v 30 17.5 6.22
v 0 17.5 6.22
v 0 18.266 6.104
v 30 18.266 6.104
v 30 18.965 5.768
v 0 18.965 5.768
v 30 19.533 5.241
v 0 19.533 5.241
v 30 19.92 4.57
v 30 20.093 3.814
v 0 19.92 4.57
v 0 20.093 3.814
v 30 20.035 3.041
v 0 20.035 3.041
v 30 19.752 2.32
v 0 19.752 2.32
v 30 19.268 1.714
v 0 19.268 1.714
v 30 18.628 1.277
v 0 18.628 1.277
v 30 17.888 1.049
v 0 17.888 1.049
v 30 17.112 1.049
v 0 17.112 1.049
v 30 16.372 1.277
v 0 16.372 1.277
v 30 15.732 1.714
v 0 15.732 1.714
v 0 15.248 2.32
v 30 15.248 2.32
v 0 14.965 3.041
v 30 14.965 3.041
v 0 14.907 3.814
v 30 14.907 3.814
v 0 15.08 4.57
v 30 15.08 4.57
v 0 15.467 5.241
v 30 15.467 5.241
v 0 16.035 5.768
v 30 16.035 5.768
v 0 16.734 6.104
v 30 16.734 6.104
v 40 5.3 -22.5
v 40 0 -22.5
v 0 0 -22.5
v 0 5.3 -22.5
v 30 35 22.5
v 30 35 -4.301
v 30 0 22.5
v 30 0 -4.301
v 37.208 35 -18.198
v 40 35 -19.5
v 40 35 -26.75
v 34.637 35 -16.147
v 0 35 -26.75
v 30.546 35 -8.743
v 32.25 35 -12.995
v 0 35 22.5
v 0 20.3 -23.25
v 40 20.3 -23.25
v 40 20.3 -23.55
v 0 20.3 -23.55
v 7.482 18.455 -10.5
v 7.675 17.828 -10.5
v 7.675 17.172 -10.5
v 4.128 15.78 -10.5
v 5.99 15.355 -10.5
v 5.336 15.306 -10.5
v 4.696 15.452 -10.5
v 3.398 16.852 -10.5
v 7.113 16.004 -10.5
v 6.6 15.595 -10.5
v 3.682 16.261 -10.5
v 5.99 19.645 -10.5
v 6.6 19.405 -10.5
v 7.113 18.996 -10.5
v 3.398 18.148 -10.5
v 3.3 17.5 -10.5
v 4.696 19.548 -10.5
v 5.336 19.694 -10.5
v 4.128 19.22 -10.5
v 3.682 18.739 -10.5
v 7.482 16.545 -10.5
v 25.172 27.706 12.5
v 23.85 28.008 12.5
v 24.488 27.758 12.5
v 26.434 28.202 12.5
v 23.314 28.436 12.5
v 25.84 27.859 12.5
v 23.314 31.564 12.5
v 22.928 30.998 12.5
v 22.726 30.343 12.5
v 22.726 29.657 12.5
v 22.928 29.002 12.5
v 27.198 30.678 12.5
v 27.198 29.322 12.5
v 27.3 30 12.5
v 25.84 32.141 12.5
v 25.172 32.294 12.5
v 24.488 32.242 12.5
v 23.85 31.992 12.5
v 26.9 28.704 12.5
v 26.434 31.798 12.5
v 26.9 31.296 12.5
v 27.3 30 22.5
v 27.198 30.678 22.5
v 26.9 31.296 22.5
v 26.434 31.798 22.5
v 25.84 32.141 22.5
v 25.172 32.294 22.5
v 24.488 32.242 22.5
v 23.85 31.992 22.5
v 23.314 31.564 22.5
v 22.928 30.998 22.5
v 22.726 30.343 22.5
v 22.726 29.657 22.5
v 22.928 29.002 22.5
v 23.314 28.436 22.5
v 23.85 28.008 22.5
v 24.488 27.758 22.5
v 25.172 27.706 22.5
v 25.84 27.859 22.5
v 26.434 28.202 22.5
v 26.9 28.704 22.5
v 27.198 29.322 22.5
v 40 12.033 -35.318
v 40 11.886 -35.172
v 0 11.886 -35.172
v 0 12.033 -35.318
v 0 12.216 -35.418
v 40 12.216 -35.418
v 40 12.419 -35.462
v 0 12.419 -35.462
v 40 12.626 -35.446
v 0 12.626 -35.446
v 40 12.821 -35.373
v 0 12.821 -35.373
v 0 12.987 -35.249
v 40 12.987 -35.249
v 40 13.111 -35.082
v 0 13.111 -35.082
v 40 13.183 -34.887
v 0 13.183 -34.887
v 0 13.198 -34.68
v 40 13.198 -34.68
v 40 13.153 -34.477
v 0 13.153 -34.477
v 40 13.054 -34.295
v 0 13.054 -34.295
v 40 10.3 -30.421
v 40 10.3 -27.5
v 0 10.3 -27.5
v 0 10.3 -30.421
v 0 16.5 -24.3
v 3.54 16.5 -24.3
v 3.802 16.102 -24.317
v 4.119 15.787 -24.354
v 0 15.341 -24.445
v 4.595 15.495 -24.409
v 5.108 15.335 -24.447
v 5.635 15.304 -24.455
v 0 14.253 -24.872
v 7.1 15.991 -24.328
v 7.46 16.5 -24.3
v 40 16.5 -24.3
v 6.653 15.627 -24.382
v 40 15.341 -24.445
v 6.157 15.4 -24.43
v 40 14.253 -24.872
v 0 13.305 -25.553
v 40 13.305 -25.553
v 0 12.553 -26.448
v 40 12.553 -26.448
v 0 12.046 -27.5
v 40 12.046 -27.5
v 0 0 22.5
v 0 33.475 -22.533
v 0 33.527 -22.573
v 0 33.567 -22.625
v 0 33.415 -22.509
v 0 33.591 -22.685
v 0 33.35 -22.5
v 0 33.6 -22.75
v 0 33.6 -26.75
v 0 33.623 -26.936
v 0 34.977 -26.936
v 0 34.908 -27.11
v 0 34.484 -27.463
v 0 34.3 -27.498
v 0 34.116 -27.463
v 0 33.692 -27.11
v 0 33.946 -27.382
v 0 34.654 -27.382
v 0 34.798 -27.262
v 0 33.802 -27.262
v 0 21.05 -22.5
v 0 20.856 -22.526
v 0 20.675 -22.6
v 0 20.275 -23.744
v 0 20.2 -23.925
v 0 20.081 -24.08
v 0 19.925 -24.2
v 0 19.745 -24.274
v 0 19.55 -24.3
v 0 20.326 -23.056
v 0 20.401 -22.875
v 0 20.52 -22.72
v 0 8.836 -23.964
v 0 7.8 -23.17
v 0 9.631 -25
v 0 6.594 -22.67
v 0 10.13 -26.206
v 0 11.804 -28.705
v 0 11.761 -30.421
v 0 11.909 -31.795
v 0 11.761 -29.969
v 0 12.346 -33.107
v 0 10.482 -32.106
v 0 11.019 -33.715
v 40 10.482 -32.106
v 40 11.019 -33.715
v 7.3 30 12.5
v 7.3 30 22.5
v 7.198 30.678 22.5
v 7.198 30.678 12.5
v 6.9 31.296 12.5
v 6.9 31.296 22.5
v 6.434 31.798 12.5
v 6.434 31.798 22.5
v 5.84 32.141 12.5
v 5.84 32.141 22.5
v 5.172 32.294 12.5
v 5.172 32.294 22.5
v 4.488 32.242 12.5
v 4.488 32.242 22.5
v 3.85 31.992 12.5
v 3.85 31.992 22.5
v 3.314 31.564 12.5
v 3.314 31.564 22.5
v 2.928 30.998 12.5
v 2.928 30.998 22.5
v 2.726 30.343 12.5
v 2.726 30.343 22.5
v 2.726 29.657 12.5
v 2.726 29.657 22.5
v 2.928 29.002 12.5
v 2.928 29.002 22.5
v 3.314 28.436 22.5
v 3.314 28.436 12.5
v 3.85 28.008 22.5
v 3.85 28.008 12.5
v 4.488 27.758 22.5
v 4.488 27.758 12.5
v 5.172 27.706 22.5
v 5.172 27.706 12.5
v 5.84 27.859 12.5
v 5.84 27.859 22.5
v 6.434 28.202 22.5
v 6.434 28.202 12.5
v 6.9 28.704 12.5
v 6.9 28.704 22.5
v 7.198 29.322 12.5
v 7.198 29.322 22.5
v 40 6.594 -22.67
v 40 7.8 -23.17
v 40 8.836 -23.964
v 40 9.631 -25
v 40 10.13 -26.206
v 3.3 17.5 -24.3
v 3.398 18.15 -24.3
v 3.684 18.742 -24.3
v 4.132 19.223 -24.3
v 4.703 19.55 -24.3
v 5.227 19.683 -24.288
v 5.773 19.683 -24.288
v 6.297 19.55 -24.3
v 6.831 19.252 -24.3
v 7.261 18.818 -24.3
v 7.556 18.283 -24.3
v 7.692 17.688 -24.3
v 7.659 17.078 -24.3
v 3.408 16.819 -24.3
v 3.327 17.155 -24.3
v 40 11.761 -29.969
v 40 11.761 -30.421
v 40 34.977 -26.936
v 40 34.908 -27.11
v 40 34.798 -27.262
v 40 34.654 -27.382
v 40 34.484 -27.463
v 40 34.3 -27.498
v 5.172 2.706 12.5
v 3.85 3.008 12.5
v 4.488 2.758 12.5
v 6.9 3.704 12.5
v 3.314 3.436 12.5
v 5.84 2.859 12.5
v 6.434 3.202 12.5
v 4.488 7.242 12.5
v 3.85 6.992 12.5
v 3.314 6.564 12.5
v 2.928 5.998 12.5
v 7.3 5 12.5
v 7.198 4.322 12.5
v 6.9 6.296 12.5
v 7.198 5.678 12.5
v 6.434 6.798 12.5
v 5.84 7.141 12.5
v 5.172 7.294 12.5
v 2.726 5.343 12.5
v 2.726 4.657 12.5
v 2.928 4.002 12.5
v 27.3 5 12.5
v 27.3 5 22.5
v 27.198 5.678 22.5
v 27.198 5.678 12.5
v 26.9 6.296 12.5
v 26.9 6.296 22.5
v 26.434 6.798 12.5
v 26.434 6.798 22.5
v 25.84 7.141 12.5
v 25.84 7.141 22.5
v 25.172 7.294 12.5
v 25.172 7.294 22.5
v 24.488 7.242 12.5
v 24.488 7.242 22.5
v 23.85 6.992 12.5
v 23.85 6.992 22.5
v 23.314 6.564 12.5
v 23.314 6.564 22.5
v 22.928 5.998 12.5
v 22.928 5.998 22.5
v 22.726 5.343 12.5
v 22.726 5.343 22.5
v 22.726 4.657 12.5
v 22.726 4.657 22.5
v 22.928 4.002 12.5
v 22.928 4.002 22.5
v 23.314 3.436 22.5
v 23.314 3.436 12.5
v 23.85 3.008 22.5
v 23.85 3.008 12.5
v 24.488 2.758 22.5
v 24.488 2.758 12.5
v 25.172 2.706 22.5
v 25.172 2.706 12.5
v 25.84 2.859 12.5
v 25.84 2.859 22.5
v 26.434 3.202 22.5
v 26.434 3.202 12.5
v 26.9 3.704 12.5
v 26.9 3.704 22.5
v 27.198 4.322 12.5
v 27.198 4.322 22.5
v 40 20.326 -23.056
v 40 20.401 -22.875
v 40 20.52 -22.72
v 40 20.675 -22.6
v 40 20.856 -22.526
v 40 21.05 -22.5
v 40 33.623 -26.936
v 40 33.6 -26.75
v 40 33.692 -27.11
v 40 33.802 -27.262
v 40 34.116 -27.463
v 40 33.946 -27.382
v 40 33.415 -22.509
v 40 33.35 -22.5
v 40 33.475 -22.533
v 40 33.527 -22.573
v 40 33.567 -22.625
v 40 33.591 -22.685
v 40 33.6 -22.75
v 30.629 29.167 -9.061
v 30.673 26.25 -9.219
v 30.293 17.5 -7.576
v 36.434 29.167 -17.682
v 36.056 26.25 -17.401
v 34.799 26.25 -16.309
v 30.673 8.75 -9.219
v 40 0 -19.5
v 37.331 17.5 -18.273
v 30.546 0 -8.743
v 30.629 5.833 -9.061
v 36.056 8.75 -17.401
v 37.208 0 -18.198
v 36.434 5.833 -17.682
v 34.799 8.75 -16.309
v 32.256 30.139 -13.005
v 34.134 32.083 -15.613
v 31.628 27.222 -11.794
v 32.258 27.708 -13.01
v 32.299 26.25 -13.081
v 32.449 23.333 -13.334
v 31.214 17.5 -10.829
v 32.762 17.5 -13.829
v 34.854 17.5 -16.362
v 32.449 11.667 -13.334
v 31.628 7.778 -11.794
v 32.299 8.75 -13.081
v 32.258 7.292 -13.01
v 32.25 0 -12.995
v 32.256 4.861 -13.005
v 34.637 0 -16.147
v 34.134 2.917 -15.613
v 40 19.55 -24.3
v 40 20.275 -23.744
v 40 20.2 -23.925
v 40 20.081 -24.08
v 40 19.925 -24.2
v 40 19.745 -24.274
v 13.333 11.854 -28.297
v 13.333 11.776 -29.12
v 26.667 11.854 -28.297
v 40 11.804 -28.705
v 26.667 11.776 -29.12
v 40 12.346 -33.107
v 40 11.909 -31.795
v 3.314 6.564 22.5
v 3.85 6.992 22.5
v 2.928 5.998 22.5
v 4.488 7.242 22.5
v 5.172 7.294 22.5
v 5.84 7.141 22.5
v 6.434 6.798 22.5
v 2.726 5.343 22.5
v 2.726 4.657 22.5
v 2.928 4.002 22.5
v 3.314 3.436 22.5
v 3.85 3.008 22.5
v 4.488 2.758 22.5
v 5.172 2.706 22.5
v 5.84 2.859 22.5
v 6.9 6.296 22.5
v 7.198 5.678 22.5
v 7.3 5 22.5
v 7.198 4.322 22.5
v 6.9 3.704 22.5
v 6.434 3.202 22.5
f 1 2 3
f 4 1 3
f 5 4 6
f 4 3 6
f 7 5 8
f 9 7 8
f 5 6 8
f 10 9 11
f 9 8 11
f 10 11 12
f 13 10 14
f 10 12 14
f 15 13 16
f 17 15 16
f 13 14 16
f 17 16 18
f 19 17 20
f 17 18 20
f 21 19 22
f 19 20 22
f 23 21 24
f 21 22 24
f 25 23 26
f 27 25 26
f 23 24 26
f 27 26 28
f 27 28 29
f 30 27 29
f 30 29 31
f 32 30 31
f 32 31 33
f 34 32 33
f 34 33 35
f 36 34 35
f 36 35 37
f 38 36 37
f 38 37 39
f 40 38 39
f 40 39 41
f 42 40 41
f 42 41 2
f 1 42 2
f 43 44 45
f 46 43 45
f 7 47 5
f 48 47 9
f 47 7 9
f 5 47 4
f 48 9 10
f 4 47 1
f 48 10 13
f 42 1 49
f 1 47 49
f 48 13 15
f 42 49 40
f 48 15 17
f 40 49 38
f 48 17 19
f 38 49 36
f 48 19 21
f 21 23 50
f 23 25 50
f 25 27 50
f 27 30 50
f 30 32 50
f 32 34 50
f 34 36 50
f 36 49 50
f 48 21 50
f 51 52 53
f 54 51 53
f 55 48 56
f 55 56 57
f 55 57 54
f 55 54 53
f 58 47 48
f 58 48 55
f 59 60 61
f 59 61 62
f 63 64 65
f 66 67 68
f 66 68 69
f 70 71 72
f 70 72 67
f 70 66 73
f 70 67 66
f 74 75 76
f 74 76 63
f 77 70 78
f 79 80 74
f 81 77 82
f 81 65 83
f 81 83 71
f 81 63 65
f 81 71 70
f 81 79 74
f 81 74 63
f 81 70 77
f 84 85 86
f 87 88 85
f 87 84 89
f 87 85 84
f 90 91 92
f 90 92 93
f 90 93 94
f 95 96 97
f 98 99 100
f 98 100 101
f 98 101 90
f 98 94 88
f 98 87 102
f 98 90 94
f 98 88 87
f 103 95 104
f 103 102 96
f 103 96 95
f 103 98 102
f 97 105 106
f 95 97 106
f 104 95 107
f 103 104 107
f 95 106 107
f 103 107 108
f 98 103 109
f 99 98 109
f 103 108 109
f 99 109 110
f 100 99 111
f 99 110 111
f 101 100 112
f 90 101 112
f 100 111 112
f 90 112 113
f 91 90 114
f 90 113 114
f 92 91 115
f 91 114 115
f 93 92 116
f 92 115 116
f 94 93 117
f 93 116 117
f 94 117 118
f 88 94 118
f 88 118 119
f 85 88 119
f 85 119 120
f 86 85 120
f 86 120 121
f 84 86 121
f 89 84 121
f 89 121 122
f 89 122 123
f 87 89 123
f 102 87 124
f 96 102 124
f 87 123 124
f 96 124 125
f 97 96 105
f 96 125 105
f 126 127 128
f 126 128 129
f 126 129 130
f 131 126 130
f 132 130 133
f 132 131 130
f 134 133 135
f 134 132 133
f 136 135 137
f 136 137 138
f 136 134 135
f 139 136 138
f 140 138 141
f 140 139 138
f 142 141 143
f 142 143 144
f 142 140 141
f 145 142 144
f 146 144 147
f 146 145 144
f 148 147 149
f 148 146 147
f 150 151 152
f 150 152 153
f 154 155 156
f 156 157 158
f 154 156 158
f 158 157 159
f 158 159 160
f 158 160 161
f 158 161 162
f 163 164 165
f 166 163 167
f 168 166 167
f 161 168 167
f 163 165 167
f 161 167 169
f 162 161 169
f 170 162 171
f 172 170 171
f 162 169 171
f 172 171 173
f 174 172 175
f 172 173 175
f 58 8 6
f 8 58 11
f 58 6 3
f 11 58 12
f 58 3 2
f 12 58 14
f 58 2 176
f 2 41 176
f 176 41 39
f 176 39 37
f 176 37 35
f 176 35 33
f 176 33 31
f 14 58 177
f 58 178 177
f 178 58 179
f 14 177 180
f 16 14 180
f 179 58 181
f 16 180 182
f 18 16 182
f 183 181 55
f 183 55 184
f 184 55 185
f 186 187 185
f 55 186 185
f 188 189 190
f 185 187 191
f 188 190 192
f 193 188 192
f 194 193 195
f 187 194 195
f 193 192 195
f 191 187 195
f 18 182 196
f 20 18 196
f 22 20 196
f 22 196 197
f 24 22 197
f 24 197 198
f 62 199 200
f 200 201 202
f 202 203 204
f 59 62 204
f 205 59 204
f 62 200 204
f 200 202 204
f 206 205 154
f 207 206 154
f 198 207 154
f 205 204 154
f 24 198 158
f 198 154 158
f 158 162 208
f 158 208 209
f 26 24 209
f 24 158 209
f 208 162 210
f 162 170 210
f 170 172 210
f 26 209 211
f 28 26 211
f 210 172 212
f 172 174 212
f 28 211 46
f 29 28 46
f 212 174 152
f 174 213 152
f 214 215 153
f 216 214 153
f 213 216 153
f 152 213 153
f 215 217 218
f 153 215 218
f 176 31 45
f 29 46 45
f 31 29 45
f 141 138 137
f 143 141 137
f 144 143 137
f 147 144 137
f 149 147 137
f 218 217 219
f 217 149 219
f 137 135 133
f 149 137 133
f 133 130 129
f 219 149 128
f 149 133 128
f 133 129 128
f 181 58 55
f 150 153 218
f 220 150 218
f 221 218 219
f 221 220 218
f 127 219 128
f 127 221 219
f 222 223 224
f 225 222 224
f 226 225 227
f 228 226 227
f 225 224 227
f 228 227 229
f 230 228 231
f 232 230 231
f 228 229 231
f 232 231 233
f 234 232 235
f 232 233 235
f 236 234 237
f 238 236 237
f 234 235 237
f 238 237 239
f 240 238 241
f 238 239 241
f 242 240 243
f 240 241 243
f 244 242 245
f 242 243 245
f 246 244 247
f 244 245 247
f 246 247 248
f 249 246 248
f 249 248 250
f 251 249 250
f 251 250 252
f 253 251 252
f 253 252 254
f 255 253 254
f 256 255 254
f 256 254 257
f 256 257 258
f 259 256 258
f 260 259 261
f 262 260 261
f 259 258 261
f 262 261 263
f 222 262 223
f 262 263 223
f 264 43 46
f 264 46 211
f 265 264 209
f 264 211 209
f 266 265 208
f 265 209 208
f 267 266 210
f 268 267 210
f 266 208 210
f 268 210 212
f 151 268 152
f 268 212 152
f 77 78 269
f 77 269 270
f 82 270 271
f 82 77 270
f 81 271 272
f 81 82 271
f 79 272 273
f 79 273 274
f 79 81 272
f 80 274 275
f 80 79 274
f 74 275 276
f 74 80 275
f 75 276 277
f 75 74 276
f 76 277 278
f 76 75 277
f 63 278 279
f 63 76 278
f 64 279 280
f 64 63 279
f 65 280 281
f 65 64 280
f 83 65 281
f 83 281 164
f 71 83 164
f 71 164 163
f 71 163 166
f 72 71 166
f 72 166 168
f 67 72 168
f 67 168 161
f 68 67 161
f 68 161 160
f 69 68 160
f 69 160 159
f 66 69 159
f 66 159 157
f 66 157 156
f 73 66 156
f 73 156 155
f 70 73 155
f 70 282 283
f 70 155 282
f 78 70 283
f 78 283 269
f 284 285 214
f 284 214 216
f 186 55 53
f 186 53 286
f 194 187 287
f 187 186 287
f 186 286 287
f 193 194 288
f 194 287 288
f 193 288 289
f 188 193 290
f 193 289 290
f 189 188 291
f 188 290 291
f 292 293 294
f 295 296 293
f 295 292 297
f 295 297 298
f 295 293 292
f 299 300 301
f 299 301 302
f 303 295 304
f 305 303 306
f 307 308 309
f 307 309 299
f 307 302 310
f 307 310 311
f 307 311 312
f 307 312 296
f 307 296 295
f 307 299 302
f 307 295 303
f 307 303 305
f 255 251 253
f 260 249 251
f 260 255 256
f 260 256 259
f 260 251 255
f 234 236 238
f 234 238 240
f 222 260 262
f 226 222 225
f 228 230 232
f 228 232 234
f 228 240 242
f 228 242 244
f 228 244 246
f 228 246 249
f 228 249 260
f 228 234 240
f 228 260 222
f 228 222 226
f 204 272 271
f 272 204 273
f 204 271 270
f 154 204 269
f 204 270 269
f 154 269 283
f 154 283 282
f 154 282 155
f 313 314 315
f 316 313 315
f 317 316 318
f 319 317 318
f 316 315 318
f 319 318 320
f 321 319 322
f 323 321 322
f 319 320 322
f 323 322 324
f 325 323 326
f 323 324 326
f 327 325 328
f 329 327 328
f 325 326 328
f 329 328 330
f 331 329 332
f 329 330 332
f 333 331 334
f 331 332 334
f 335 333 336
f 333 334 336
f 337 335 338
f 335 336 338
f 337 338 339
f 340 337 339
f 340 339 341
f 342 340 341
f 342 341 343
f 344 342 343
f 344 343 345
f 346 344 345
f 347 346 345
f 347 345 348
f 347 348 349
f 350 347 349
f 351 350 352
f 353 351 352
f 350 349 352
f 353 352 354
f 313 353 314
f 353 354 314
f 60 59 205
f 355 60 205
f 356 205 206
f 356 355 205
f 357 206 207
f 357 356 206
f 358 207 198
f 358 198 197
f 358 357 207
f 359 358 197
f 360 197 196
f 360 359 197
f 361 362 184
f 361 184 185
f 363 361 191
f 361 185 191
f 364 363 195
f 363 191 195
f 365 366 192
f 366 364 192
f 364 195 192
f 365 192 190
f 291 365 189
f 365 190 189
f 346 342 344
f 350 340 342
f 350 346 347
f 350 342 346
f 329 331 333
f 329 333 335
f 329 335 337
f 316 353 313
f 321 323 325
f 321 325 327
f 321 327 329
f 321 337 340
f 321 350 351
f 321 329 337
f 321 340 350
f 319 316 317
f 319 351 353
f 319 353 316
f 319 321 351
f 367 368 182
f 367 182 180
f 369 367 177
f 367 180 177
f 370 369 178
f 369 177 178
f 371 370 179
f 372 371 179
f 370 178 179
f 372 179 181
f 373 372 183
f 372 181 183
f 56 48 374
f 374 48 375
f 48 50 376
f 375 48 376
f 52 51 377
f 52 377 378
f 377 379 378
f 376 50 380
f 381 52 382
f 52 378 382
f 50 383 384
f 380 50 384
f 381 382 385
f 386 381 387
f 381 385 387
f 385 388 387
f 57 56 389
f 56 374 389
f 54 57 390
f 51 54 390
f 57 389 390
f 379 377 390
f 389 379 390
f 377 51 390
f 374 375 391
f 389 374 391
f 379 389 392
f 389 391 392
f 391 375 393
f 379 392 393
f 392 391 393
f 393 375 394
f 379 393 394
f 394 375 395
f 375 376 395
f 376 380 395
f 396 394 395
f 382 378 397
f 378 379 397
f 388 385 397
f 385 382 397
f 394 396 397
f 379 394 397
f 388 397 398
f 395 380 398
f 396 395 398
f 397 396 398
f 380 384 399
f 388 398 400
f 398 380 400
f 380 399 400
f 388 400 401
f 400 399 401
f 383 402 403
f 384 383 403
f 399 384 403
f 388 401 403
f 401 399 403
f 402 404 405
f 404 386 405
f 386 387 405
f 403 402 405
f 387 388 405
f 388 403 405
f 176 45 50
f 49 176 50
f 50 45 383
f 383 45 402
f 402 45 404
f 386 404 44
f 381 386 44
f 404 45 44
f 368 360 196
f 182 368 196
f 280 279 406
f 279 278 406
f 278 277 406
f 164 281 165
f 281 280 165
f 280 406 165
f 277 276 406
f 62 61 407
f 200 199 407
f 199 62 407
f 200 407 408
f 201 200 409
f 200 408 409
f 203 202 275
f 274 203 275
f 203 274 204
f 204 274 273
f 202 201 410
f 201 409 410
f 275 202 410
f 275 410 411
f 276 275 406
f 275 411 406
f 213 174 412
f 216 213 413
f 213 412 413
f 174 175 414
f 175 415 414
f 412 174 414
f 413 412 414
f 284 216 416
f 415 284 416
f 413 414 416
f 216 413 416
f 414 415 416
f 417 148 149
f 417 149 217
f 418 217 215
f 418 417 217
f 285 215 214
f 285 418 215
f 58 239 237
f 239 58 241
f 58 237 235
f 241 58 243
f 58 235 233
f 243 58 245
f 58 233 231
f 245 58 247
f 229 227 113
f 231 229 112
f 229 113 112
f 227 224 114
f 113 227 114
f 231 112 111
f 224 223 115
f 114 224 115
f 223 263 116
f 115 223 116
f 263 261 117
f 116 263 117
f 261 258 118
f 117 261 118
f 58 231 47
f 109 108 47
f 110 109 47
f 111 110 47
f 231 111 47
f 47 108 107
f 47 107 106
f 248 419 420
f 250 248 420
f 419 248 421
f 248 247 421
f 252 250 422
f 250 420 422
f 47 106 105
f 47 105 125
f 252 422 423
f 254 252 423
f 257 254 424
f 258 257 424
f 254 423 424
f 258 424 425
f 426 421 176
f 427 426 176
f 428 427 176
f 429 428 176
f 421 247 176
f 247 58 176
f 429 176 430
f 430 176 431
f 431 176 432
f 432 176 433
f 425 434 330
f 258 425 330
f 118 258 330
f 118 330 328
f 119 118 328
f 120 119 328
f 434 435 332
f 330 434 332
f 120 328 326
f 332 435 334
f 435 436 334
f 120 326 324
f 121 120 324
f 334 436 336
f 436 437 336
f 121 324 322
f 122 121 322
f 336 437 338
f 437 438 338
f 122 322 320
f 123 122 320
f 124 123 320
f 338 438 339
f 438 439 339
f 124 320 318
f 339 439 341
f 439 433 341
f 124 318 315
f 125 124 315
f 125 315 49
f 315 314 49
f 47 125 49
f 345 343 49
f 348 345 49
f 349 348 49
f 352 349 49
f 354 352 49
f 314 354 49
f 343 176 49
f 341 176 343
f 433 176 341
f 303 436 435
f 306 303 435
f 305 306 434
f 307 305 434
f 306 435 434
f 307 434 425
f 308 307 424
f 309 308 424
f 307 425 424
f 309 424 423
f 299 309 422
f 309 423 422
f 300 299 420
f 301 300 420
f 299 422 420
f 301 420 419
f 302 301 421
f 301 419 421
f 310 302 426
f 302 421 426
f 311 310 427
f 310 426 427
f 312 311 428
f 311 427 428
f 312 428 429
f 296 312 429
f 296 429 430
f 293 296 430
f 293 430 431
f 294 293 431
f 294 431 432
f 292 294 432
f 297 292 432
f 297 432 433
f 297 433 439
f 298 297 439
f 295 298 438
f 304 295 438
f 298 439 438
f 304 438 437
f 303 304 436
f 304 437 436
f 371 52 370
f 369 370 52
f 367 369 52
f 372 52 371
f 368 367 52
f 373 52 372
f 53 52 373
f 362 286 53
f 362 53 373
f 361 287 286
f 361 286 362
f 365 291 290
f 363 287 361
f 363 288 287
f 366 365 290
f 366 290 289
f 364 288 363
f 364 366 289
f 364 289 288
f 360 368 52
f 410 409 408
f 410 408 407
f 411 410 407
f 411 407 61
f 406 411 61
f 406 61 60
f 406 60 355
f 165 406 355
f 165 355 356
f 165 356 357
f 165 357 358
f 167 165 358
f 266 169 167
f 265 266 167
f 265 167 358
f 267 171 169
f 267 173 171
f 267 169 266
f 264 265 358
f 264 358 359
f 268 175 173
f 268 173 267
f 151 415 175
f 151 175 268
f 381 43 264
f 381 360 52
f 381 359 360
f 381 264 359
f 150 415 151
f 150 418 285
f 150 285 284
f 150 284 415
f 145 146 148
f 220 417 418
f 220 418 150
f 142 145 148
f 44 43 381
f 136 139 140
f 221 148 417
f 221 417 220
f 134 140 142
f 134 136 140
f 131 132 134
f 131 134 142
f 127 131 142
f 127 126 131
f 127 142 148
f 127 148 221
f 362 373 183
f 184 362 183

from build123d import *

# Parameters (mm, degrees)
BOSS_EXTRUDE1_DEPTH     = 35
SKETCH3_R               = 2.6
CUT_EXTRUDE1_DEPTH      = 58.716981903
FILLET1_DEPTH           = 35
SKETCH5_R               = 2.3
CUT_EXTRUDE3_DEPTH      = 10
SKETCH7_W               = 40
SKETCH7_H               = 1.4
SKETCH7_H_2             = 10
BOSS_EXTRUDE2_DEPTH     = 5
CUT_EXTRUDE2_DEPTH      = 70.641941558
CUT_EXTRUDE2_DEPTH_BACK = 12
SKETCH4_R               = 2.2
CUT_EXTRUDE4_DEPTH      = 60.843546189
FILLET2_R               = 0.75
BOSS_EXTRUDE3_DEPTH     = 40
FILLET3_R               = 0.75
FILLET4_R               = 0.25
FILLET5_R               = 5


with BuildPart() as part:
    # Sketch1 → Boss-Extrude1 (new body)
    with BuildSketch(Plane(origin=(0, 0, 0), x_dir=(1, 0, 0), z_dir=(0, 1, 0))):
        Polygon((0, 22.5), (0, -22.5), (30, -22.5), (30, 19.5), (40, 19.5), (40, 22.5), align=None)
    extrude(amount=BOSS_EXTRUDE1_DEPTH)

    # Sketch3 → Cut-Extrude1 (cut, through all)
    with BuildSketch(Plane.ZY):
        with Locations((3.62, 17.5)):
            Circle(SKETCH3_R)
    extrude(amount=-CUT_EXTRUDE1_DEPTH, mode=Mode.SUBTRACT)

    # Fillet1: read off the stored shape, not the designer's step
    # Fillet1 outline → Fillet1 (add)
    with BuildSketch(Plane(origin=(0, 0, 0), x_dir=(1, 0, 0), z_dir=(0, 1, 0))):
        with BuildLine():
            Line((30, 19.5), (30, 4.301315846))
            add(Edge.make_bspline(
                [(30, 4.301315846), (30, 16.210241525), (40, 19.5)],
                knots=[0, 0, 0, 1, 1, 1], degree=2, weights=[1, 0.810092587, 1]))
            Line((40, 19.5), (30, 19.5))
        make_face()
    extrude(amount=FILLET1_DEPTH)

    # Sketch5 → Cut-Extrude3 (cut)
    with BuildSketch(Plane.XY.offset(22.5)):
        with Locations((5, 30)):
            Circle(SKETCH5_R)
        with Locations((5, 5)):
            Circle(SKETCH5_R)
        with Locations((25, 5)):
            Circle(SKETCH5_R)
        with Locations((25, 30)):
            Circle(SKETCH5_R)
    extrude(amount=-CUT_EXTRUDE3_DEPTH, mode=Mode.SUBTRACT)

    # Sketch7 → Boss-Extrude2 (add)
    with BuildSketch(Plane(origin=(0, 0, -22.5), x_dir=(-1, 0, 0), z_dir=(0, 0, -1))):
        with Locations((-20, 34.3)):
            Rectangle(SKETCH7_W, SKETCH7_H)
        with Locations((-20, 15.30039382)):
            Rectangle(SKETCH7_W, SKETCH7_H_2)
    extrude(amount=BOSS_EXTRUDE2_DEPTH)

    # Sketch4 → Cut-Extrude2 (cut, two sides: drawn at the far end of the back side and taken through both)
    with BuildSketch(Plane(origin=(0, 0, -22.5), x_dir=(-1, 0, 0), z_dir=(0, 0, -1)).offset(-CUT_EXTRUDE2_DEPTH_BACK)):
        with Locations((-5.5, 17.5)):
            Circle(SKETCH4_R)
    extrude(amount=CUT_EXTRUDE2_DEPTH + CUT_EXTRUDE2_DEPTH_BACK, mode=Mode.SUBTRACT)

    # Sketch9 → Cut-Extrude4 (cut, through all)
    with BuildSketch(Plane(origin=(40, 0, 0), x_dir=(0, 0, -1), z_dir=(1, 0, 0))):
        with BuildLine():
            Line((27.5, 20.30039382), (24.3, 20.30039382))
            Line((24.3, 20.30039382), (24.3, 16.5))
            ThreePointArc((24.3, 16.5), (25.182933063, 13.75773816), (27.5, 12.04578851))
            Line((27.5, 12.04578851), (27.5, 20.30039382))
        make_face()
    extrude(amount=-CUT_EXTRUDE4_DEPTH, mode=Mode.SUBTRACT)

    # Fillet2
    # the kernel refuses this fillet: 0.75 mm, written as the material it takes off along each edge
    with BuildSketch(Plane(origin=(41.875, 20.30039382, -24.3), x_dir=(0, 0, 1), z_dir=(-1, 0, 0))) as fillet2_piece_1:
        with BuildLine():
            CenterArc((FILLET2_R, -FILLET2_R), FILLET2_R, 90, 90)
            Line((0, -FILLET2_R), (0, 0))
            Line((0, 0), (FILLET2_R, 0))
        make_face()
    extrude(amount=43.75, mode=Mode.SUBTRACT)

    # Sketch10 → Boss-Extrude3 (add, through all)
    with BuildSketch(Plane(origin=(40, 0, 0), x_dir=(0, 0, -1), z_dir=(1, 0, 0))):
        with BuildLine():
            Line((30.420638784, 11.76058351), (29.969418861, 11.76058351))
            add(Edge.make_bspline(
                [(27.5, 12.04578851), (28.285278796, 11.781338069), (29.10521732, 11.76058351), (29.969418861, 11.76058351)],
                knots=[0, 0, 0, 0, 1, 1, 1, 1], degree=3))
            Line((27.5, 12.04578851), (27.5, 10.30039382))
            Line((27.5, 10.30039382), (30.420638784, 10.30039382))
            ThreePointArc((30.420638784, 10.30039382), (32.925002128, 10.70728085), (35.171736316, 11.886084613))
            ThreePointArc((35.171736316, 11.886084613), (35.316984097, 12.908327269), (34.294741441, 13.05357505))
            ThreePointArc((34.294741441, 13.05357505), (32.462727085, 12.092364139), (30.420638784, 11.76058351))
        make_face()
    extrude(amount=-BOSS_EXTRUDE3_DEPTH)

    # Fillet3
    # the kernel refuses this fillet: 0.75 mm, written as the material it adds along each edge
    with BuildSketch(Plane(origin=(40, 20.30039382, -22.5), x_dir=(0, 1, 0), z_dir=(-1, 0, 0))) as fillet3_piece_1:
        with BuildLine():
            CenterArc((FILLET3_R, FILLET3_R), FILLET3_R, 180, 90)
            Line((0, FILLET3_R), (0, 0))
            Line((0, 0), (FILLET3_R, 0))
        make_face()
    extrude(amount=40)
    # the kernel refuses this fillet: 0.75 mm, written as the material it takes off along each edge
    with BuildSketch(Plane(origin=(41.875, 35, -27.5), x_dir=(0, -1, 0), z_dir=(-1, 0, 0))) as fillet3_2_piece_1:
        with BuildLine():
            CenterArc((FILLET3_R, FILLET3_R), FILLET3_R, 180, 90)
            Line((0, FILLET3_R), (0, 0))
            Line((0, 0), (FILLET3_R, 0))
        make_face()
    extrude(amount=43.75, mode=Mode.SUBTRACT)
    with BuildSketch(Plane(origin=(-1.875, 33.6, -27.5), x_dir=(0, 0, 1), z_dir=(1, 0, 0))) as fillet3_2_piece_2:
        with BuildLine():
            CenterArc((FILLET3_R, -FILLET3_R), FILLET3_R, 90, 90)
            Line((0, -FILLET3_R), (0, 0))
            Line((0, 0), (FILLET3_R, 0))
        make_face()
    extrude(amount=43.75, mode=Mode.SUBTRACT)

    # Fillet4
    fillet4_edges = [part.edges().sort_by_distance(p)[0] for p in [
        (20, 33.6, -22.5),
    ]]
    fillet(fillet4_edges, radius=FILLET4_R)

    # Fillet5
    fillet5_edges = [part.edges().sort_by_distance(p)[0] for p in [
        (20, 10.30039382, -22.5),
    ]]
    fillet(fillet5_edges, radius=FILLET5_R)


solid = part.part
